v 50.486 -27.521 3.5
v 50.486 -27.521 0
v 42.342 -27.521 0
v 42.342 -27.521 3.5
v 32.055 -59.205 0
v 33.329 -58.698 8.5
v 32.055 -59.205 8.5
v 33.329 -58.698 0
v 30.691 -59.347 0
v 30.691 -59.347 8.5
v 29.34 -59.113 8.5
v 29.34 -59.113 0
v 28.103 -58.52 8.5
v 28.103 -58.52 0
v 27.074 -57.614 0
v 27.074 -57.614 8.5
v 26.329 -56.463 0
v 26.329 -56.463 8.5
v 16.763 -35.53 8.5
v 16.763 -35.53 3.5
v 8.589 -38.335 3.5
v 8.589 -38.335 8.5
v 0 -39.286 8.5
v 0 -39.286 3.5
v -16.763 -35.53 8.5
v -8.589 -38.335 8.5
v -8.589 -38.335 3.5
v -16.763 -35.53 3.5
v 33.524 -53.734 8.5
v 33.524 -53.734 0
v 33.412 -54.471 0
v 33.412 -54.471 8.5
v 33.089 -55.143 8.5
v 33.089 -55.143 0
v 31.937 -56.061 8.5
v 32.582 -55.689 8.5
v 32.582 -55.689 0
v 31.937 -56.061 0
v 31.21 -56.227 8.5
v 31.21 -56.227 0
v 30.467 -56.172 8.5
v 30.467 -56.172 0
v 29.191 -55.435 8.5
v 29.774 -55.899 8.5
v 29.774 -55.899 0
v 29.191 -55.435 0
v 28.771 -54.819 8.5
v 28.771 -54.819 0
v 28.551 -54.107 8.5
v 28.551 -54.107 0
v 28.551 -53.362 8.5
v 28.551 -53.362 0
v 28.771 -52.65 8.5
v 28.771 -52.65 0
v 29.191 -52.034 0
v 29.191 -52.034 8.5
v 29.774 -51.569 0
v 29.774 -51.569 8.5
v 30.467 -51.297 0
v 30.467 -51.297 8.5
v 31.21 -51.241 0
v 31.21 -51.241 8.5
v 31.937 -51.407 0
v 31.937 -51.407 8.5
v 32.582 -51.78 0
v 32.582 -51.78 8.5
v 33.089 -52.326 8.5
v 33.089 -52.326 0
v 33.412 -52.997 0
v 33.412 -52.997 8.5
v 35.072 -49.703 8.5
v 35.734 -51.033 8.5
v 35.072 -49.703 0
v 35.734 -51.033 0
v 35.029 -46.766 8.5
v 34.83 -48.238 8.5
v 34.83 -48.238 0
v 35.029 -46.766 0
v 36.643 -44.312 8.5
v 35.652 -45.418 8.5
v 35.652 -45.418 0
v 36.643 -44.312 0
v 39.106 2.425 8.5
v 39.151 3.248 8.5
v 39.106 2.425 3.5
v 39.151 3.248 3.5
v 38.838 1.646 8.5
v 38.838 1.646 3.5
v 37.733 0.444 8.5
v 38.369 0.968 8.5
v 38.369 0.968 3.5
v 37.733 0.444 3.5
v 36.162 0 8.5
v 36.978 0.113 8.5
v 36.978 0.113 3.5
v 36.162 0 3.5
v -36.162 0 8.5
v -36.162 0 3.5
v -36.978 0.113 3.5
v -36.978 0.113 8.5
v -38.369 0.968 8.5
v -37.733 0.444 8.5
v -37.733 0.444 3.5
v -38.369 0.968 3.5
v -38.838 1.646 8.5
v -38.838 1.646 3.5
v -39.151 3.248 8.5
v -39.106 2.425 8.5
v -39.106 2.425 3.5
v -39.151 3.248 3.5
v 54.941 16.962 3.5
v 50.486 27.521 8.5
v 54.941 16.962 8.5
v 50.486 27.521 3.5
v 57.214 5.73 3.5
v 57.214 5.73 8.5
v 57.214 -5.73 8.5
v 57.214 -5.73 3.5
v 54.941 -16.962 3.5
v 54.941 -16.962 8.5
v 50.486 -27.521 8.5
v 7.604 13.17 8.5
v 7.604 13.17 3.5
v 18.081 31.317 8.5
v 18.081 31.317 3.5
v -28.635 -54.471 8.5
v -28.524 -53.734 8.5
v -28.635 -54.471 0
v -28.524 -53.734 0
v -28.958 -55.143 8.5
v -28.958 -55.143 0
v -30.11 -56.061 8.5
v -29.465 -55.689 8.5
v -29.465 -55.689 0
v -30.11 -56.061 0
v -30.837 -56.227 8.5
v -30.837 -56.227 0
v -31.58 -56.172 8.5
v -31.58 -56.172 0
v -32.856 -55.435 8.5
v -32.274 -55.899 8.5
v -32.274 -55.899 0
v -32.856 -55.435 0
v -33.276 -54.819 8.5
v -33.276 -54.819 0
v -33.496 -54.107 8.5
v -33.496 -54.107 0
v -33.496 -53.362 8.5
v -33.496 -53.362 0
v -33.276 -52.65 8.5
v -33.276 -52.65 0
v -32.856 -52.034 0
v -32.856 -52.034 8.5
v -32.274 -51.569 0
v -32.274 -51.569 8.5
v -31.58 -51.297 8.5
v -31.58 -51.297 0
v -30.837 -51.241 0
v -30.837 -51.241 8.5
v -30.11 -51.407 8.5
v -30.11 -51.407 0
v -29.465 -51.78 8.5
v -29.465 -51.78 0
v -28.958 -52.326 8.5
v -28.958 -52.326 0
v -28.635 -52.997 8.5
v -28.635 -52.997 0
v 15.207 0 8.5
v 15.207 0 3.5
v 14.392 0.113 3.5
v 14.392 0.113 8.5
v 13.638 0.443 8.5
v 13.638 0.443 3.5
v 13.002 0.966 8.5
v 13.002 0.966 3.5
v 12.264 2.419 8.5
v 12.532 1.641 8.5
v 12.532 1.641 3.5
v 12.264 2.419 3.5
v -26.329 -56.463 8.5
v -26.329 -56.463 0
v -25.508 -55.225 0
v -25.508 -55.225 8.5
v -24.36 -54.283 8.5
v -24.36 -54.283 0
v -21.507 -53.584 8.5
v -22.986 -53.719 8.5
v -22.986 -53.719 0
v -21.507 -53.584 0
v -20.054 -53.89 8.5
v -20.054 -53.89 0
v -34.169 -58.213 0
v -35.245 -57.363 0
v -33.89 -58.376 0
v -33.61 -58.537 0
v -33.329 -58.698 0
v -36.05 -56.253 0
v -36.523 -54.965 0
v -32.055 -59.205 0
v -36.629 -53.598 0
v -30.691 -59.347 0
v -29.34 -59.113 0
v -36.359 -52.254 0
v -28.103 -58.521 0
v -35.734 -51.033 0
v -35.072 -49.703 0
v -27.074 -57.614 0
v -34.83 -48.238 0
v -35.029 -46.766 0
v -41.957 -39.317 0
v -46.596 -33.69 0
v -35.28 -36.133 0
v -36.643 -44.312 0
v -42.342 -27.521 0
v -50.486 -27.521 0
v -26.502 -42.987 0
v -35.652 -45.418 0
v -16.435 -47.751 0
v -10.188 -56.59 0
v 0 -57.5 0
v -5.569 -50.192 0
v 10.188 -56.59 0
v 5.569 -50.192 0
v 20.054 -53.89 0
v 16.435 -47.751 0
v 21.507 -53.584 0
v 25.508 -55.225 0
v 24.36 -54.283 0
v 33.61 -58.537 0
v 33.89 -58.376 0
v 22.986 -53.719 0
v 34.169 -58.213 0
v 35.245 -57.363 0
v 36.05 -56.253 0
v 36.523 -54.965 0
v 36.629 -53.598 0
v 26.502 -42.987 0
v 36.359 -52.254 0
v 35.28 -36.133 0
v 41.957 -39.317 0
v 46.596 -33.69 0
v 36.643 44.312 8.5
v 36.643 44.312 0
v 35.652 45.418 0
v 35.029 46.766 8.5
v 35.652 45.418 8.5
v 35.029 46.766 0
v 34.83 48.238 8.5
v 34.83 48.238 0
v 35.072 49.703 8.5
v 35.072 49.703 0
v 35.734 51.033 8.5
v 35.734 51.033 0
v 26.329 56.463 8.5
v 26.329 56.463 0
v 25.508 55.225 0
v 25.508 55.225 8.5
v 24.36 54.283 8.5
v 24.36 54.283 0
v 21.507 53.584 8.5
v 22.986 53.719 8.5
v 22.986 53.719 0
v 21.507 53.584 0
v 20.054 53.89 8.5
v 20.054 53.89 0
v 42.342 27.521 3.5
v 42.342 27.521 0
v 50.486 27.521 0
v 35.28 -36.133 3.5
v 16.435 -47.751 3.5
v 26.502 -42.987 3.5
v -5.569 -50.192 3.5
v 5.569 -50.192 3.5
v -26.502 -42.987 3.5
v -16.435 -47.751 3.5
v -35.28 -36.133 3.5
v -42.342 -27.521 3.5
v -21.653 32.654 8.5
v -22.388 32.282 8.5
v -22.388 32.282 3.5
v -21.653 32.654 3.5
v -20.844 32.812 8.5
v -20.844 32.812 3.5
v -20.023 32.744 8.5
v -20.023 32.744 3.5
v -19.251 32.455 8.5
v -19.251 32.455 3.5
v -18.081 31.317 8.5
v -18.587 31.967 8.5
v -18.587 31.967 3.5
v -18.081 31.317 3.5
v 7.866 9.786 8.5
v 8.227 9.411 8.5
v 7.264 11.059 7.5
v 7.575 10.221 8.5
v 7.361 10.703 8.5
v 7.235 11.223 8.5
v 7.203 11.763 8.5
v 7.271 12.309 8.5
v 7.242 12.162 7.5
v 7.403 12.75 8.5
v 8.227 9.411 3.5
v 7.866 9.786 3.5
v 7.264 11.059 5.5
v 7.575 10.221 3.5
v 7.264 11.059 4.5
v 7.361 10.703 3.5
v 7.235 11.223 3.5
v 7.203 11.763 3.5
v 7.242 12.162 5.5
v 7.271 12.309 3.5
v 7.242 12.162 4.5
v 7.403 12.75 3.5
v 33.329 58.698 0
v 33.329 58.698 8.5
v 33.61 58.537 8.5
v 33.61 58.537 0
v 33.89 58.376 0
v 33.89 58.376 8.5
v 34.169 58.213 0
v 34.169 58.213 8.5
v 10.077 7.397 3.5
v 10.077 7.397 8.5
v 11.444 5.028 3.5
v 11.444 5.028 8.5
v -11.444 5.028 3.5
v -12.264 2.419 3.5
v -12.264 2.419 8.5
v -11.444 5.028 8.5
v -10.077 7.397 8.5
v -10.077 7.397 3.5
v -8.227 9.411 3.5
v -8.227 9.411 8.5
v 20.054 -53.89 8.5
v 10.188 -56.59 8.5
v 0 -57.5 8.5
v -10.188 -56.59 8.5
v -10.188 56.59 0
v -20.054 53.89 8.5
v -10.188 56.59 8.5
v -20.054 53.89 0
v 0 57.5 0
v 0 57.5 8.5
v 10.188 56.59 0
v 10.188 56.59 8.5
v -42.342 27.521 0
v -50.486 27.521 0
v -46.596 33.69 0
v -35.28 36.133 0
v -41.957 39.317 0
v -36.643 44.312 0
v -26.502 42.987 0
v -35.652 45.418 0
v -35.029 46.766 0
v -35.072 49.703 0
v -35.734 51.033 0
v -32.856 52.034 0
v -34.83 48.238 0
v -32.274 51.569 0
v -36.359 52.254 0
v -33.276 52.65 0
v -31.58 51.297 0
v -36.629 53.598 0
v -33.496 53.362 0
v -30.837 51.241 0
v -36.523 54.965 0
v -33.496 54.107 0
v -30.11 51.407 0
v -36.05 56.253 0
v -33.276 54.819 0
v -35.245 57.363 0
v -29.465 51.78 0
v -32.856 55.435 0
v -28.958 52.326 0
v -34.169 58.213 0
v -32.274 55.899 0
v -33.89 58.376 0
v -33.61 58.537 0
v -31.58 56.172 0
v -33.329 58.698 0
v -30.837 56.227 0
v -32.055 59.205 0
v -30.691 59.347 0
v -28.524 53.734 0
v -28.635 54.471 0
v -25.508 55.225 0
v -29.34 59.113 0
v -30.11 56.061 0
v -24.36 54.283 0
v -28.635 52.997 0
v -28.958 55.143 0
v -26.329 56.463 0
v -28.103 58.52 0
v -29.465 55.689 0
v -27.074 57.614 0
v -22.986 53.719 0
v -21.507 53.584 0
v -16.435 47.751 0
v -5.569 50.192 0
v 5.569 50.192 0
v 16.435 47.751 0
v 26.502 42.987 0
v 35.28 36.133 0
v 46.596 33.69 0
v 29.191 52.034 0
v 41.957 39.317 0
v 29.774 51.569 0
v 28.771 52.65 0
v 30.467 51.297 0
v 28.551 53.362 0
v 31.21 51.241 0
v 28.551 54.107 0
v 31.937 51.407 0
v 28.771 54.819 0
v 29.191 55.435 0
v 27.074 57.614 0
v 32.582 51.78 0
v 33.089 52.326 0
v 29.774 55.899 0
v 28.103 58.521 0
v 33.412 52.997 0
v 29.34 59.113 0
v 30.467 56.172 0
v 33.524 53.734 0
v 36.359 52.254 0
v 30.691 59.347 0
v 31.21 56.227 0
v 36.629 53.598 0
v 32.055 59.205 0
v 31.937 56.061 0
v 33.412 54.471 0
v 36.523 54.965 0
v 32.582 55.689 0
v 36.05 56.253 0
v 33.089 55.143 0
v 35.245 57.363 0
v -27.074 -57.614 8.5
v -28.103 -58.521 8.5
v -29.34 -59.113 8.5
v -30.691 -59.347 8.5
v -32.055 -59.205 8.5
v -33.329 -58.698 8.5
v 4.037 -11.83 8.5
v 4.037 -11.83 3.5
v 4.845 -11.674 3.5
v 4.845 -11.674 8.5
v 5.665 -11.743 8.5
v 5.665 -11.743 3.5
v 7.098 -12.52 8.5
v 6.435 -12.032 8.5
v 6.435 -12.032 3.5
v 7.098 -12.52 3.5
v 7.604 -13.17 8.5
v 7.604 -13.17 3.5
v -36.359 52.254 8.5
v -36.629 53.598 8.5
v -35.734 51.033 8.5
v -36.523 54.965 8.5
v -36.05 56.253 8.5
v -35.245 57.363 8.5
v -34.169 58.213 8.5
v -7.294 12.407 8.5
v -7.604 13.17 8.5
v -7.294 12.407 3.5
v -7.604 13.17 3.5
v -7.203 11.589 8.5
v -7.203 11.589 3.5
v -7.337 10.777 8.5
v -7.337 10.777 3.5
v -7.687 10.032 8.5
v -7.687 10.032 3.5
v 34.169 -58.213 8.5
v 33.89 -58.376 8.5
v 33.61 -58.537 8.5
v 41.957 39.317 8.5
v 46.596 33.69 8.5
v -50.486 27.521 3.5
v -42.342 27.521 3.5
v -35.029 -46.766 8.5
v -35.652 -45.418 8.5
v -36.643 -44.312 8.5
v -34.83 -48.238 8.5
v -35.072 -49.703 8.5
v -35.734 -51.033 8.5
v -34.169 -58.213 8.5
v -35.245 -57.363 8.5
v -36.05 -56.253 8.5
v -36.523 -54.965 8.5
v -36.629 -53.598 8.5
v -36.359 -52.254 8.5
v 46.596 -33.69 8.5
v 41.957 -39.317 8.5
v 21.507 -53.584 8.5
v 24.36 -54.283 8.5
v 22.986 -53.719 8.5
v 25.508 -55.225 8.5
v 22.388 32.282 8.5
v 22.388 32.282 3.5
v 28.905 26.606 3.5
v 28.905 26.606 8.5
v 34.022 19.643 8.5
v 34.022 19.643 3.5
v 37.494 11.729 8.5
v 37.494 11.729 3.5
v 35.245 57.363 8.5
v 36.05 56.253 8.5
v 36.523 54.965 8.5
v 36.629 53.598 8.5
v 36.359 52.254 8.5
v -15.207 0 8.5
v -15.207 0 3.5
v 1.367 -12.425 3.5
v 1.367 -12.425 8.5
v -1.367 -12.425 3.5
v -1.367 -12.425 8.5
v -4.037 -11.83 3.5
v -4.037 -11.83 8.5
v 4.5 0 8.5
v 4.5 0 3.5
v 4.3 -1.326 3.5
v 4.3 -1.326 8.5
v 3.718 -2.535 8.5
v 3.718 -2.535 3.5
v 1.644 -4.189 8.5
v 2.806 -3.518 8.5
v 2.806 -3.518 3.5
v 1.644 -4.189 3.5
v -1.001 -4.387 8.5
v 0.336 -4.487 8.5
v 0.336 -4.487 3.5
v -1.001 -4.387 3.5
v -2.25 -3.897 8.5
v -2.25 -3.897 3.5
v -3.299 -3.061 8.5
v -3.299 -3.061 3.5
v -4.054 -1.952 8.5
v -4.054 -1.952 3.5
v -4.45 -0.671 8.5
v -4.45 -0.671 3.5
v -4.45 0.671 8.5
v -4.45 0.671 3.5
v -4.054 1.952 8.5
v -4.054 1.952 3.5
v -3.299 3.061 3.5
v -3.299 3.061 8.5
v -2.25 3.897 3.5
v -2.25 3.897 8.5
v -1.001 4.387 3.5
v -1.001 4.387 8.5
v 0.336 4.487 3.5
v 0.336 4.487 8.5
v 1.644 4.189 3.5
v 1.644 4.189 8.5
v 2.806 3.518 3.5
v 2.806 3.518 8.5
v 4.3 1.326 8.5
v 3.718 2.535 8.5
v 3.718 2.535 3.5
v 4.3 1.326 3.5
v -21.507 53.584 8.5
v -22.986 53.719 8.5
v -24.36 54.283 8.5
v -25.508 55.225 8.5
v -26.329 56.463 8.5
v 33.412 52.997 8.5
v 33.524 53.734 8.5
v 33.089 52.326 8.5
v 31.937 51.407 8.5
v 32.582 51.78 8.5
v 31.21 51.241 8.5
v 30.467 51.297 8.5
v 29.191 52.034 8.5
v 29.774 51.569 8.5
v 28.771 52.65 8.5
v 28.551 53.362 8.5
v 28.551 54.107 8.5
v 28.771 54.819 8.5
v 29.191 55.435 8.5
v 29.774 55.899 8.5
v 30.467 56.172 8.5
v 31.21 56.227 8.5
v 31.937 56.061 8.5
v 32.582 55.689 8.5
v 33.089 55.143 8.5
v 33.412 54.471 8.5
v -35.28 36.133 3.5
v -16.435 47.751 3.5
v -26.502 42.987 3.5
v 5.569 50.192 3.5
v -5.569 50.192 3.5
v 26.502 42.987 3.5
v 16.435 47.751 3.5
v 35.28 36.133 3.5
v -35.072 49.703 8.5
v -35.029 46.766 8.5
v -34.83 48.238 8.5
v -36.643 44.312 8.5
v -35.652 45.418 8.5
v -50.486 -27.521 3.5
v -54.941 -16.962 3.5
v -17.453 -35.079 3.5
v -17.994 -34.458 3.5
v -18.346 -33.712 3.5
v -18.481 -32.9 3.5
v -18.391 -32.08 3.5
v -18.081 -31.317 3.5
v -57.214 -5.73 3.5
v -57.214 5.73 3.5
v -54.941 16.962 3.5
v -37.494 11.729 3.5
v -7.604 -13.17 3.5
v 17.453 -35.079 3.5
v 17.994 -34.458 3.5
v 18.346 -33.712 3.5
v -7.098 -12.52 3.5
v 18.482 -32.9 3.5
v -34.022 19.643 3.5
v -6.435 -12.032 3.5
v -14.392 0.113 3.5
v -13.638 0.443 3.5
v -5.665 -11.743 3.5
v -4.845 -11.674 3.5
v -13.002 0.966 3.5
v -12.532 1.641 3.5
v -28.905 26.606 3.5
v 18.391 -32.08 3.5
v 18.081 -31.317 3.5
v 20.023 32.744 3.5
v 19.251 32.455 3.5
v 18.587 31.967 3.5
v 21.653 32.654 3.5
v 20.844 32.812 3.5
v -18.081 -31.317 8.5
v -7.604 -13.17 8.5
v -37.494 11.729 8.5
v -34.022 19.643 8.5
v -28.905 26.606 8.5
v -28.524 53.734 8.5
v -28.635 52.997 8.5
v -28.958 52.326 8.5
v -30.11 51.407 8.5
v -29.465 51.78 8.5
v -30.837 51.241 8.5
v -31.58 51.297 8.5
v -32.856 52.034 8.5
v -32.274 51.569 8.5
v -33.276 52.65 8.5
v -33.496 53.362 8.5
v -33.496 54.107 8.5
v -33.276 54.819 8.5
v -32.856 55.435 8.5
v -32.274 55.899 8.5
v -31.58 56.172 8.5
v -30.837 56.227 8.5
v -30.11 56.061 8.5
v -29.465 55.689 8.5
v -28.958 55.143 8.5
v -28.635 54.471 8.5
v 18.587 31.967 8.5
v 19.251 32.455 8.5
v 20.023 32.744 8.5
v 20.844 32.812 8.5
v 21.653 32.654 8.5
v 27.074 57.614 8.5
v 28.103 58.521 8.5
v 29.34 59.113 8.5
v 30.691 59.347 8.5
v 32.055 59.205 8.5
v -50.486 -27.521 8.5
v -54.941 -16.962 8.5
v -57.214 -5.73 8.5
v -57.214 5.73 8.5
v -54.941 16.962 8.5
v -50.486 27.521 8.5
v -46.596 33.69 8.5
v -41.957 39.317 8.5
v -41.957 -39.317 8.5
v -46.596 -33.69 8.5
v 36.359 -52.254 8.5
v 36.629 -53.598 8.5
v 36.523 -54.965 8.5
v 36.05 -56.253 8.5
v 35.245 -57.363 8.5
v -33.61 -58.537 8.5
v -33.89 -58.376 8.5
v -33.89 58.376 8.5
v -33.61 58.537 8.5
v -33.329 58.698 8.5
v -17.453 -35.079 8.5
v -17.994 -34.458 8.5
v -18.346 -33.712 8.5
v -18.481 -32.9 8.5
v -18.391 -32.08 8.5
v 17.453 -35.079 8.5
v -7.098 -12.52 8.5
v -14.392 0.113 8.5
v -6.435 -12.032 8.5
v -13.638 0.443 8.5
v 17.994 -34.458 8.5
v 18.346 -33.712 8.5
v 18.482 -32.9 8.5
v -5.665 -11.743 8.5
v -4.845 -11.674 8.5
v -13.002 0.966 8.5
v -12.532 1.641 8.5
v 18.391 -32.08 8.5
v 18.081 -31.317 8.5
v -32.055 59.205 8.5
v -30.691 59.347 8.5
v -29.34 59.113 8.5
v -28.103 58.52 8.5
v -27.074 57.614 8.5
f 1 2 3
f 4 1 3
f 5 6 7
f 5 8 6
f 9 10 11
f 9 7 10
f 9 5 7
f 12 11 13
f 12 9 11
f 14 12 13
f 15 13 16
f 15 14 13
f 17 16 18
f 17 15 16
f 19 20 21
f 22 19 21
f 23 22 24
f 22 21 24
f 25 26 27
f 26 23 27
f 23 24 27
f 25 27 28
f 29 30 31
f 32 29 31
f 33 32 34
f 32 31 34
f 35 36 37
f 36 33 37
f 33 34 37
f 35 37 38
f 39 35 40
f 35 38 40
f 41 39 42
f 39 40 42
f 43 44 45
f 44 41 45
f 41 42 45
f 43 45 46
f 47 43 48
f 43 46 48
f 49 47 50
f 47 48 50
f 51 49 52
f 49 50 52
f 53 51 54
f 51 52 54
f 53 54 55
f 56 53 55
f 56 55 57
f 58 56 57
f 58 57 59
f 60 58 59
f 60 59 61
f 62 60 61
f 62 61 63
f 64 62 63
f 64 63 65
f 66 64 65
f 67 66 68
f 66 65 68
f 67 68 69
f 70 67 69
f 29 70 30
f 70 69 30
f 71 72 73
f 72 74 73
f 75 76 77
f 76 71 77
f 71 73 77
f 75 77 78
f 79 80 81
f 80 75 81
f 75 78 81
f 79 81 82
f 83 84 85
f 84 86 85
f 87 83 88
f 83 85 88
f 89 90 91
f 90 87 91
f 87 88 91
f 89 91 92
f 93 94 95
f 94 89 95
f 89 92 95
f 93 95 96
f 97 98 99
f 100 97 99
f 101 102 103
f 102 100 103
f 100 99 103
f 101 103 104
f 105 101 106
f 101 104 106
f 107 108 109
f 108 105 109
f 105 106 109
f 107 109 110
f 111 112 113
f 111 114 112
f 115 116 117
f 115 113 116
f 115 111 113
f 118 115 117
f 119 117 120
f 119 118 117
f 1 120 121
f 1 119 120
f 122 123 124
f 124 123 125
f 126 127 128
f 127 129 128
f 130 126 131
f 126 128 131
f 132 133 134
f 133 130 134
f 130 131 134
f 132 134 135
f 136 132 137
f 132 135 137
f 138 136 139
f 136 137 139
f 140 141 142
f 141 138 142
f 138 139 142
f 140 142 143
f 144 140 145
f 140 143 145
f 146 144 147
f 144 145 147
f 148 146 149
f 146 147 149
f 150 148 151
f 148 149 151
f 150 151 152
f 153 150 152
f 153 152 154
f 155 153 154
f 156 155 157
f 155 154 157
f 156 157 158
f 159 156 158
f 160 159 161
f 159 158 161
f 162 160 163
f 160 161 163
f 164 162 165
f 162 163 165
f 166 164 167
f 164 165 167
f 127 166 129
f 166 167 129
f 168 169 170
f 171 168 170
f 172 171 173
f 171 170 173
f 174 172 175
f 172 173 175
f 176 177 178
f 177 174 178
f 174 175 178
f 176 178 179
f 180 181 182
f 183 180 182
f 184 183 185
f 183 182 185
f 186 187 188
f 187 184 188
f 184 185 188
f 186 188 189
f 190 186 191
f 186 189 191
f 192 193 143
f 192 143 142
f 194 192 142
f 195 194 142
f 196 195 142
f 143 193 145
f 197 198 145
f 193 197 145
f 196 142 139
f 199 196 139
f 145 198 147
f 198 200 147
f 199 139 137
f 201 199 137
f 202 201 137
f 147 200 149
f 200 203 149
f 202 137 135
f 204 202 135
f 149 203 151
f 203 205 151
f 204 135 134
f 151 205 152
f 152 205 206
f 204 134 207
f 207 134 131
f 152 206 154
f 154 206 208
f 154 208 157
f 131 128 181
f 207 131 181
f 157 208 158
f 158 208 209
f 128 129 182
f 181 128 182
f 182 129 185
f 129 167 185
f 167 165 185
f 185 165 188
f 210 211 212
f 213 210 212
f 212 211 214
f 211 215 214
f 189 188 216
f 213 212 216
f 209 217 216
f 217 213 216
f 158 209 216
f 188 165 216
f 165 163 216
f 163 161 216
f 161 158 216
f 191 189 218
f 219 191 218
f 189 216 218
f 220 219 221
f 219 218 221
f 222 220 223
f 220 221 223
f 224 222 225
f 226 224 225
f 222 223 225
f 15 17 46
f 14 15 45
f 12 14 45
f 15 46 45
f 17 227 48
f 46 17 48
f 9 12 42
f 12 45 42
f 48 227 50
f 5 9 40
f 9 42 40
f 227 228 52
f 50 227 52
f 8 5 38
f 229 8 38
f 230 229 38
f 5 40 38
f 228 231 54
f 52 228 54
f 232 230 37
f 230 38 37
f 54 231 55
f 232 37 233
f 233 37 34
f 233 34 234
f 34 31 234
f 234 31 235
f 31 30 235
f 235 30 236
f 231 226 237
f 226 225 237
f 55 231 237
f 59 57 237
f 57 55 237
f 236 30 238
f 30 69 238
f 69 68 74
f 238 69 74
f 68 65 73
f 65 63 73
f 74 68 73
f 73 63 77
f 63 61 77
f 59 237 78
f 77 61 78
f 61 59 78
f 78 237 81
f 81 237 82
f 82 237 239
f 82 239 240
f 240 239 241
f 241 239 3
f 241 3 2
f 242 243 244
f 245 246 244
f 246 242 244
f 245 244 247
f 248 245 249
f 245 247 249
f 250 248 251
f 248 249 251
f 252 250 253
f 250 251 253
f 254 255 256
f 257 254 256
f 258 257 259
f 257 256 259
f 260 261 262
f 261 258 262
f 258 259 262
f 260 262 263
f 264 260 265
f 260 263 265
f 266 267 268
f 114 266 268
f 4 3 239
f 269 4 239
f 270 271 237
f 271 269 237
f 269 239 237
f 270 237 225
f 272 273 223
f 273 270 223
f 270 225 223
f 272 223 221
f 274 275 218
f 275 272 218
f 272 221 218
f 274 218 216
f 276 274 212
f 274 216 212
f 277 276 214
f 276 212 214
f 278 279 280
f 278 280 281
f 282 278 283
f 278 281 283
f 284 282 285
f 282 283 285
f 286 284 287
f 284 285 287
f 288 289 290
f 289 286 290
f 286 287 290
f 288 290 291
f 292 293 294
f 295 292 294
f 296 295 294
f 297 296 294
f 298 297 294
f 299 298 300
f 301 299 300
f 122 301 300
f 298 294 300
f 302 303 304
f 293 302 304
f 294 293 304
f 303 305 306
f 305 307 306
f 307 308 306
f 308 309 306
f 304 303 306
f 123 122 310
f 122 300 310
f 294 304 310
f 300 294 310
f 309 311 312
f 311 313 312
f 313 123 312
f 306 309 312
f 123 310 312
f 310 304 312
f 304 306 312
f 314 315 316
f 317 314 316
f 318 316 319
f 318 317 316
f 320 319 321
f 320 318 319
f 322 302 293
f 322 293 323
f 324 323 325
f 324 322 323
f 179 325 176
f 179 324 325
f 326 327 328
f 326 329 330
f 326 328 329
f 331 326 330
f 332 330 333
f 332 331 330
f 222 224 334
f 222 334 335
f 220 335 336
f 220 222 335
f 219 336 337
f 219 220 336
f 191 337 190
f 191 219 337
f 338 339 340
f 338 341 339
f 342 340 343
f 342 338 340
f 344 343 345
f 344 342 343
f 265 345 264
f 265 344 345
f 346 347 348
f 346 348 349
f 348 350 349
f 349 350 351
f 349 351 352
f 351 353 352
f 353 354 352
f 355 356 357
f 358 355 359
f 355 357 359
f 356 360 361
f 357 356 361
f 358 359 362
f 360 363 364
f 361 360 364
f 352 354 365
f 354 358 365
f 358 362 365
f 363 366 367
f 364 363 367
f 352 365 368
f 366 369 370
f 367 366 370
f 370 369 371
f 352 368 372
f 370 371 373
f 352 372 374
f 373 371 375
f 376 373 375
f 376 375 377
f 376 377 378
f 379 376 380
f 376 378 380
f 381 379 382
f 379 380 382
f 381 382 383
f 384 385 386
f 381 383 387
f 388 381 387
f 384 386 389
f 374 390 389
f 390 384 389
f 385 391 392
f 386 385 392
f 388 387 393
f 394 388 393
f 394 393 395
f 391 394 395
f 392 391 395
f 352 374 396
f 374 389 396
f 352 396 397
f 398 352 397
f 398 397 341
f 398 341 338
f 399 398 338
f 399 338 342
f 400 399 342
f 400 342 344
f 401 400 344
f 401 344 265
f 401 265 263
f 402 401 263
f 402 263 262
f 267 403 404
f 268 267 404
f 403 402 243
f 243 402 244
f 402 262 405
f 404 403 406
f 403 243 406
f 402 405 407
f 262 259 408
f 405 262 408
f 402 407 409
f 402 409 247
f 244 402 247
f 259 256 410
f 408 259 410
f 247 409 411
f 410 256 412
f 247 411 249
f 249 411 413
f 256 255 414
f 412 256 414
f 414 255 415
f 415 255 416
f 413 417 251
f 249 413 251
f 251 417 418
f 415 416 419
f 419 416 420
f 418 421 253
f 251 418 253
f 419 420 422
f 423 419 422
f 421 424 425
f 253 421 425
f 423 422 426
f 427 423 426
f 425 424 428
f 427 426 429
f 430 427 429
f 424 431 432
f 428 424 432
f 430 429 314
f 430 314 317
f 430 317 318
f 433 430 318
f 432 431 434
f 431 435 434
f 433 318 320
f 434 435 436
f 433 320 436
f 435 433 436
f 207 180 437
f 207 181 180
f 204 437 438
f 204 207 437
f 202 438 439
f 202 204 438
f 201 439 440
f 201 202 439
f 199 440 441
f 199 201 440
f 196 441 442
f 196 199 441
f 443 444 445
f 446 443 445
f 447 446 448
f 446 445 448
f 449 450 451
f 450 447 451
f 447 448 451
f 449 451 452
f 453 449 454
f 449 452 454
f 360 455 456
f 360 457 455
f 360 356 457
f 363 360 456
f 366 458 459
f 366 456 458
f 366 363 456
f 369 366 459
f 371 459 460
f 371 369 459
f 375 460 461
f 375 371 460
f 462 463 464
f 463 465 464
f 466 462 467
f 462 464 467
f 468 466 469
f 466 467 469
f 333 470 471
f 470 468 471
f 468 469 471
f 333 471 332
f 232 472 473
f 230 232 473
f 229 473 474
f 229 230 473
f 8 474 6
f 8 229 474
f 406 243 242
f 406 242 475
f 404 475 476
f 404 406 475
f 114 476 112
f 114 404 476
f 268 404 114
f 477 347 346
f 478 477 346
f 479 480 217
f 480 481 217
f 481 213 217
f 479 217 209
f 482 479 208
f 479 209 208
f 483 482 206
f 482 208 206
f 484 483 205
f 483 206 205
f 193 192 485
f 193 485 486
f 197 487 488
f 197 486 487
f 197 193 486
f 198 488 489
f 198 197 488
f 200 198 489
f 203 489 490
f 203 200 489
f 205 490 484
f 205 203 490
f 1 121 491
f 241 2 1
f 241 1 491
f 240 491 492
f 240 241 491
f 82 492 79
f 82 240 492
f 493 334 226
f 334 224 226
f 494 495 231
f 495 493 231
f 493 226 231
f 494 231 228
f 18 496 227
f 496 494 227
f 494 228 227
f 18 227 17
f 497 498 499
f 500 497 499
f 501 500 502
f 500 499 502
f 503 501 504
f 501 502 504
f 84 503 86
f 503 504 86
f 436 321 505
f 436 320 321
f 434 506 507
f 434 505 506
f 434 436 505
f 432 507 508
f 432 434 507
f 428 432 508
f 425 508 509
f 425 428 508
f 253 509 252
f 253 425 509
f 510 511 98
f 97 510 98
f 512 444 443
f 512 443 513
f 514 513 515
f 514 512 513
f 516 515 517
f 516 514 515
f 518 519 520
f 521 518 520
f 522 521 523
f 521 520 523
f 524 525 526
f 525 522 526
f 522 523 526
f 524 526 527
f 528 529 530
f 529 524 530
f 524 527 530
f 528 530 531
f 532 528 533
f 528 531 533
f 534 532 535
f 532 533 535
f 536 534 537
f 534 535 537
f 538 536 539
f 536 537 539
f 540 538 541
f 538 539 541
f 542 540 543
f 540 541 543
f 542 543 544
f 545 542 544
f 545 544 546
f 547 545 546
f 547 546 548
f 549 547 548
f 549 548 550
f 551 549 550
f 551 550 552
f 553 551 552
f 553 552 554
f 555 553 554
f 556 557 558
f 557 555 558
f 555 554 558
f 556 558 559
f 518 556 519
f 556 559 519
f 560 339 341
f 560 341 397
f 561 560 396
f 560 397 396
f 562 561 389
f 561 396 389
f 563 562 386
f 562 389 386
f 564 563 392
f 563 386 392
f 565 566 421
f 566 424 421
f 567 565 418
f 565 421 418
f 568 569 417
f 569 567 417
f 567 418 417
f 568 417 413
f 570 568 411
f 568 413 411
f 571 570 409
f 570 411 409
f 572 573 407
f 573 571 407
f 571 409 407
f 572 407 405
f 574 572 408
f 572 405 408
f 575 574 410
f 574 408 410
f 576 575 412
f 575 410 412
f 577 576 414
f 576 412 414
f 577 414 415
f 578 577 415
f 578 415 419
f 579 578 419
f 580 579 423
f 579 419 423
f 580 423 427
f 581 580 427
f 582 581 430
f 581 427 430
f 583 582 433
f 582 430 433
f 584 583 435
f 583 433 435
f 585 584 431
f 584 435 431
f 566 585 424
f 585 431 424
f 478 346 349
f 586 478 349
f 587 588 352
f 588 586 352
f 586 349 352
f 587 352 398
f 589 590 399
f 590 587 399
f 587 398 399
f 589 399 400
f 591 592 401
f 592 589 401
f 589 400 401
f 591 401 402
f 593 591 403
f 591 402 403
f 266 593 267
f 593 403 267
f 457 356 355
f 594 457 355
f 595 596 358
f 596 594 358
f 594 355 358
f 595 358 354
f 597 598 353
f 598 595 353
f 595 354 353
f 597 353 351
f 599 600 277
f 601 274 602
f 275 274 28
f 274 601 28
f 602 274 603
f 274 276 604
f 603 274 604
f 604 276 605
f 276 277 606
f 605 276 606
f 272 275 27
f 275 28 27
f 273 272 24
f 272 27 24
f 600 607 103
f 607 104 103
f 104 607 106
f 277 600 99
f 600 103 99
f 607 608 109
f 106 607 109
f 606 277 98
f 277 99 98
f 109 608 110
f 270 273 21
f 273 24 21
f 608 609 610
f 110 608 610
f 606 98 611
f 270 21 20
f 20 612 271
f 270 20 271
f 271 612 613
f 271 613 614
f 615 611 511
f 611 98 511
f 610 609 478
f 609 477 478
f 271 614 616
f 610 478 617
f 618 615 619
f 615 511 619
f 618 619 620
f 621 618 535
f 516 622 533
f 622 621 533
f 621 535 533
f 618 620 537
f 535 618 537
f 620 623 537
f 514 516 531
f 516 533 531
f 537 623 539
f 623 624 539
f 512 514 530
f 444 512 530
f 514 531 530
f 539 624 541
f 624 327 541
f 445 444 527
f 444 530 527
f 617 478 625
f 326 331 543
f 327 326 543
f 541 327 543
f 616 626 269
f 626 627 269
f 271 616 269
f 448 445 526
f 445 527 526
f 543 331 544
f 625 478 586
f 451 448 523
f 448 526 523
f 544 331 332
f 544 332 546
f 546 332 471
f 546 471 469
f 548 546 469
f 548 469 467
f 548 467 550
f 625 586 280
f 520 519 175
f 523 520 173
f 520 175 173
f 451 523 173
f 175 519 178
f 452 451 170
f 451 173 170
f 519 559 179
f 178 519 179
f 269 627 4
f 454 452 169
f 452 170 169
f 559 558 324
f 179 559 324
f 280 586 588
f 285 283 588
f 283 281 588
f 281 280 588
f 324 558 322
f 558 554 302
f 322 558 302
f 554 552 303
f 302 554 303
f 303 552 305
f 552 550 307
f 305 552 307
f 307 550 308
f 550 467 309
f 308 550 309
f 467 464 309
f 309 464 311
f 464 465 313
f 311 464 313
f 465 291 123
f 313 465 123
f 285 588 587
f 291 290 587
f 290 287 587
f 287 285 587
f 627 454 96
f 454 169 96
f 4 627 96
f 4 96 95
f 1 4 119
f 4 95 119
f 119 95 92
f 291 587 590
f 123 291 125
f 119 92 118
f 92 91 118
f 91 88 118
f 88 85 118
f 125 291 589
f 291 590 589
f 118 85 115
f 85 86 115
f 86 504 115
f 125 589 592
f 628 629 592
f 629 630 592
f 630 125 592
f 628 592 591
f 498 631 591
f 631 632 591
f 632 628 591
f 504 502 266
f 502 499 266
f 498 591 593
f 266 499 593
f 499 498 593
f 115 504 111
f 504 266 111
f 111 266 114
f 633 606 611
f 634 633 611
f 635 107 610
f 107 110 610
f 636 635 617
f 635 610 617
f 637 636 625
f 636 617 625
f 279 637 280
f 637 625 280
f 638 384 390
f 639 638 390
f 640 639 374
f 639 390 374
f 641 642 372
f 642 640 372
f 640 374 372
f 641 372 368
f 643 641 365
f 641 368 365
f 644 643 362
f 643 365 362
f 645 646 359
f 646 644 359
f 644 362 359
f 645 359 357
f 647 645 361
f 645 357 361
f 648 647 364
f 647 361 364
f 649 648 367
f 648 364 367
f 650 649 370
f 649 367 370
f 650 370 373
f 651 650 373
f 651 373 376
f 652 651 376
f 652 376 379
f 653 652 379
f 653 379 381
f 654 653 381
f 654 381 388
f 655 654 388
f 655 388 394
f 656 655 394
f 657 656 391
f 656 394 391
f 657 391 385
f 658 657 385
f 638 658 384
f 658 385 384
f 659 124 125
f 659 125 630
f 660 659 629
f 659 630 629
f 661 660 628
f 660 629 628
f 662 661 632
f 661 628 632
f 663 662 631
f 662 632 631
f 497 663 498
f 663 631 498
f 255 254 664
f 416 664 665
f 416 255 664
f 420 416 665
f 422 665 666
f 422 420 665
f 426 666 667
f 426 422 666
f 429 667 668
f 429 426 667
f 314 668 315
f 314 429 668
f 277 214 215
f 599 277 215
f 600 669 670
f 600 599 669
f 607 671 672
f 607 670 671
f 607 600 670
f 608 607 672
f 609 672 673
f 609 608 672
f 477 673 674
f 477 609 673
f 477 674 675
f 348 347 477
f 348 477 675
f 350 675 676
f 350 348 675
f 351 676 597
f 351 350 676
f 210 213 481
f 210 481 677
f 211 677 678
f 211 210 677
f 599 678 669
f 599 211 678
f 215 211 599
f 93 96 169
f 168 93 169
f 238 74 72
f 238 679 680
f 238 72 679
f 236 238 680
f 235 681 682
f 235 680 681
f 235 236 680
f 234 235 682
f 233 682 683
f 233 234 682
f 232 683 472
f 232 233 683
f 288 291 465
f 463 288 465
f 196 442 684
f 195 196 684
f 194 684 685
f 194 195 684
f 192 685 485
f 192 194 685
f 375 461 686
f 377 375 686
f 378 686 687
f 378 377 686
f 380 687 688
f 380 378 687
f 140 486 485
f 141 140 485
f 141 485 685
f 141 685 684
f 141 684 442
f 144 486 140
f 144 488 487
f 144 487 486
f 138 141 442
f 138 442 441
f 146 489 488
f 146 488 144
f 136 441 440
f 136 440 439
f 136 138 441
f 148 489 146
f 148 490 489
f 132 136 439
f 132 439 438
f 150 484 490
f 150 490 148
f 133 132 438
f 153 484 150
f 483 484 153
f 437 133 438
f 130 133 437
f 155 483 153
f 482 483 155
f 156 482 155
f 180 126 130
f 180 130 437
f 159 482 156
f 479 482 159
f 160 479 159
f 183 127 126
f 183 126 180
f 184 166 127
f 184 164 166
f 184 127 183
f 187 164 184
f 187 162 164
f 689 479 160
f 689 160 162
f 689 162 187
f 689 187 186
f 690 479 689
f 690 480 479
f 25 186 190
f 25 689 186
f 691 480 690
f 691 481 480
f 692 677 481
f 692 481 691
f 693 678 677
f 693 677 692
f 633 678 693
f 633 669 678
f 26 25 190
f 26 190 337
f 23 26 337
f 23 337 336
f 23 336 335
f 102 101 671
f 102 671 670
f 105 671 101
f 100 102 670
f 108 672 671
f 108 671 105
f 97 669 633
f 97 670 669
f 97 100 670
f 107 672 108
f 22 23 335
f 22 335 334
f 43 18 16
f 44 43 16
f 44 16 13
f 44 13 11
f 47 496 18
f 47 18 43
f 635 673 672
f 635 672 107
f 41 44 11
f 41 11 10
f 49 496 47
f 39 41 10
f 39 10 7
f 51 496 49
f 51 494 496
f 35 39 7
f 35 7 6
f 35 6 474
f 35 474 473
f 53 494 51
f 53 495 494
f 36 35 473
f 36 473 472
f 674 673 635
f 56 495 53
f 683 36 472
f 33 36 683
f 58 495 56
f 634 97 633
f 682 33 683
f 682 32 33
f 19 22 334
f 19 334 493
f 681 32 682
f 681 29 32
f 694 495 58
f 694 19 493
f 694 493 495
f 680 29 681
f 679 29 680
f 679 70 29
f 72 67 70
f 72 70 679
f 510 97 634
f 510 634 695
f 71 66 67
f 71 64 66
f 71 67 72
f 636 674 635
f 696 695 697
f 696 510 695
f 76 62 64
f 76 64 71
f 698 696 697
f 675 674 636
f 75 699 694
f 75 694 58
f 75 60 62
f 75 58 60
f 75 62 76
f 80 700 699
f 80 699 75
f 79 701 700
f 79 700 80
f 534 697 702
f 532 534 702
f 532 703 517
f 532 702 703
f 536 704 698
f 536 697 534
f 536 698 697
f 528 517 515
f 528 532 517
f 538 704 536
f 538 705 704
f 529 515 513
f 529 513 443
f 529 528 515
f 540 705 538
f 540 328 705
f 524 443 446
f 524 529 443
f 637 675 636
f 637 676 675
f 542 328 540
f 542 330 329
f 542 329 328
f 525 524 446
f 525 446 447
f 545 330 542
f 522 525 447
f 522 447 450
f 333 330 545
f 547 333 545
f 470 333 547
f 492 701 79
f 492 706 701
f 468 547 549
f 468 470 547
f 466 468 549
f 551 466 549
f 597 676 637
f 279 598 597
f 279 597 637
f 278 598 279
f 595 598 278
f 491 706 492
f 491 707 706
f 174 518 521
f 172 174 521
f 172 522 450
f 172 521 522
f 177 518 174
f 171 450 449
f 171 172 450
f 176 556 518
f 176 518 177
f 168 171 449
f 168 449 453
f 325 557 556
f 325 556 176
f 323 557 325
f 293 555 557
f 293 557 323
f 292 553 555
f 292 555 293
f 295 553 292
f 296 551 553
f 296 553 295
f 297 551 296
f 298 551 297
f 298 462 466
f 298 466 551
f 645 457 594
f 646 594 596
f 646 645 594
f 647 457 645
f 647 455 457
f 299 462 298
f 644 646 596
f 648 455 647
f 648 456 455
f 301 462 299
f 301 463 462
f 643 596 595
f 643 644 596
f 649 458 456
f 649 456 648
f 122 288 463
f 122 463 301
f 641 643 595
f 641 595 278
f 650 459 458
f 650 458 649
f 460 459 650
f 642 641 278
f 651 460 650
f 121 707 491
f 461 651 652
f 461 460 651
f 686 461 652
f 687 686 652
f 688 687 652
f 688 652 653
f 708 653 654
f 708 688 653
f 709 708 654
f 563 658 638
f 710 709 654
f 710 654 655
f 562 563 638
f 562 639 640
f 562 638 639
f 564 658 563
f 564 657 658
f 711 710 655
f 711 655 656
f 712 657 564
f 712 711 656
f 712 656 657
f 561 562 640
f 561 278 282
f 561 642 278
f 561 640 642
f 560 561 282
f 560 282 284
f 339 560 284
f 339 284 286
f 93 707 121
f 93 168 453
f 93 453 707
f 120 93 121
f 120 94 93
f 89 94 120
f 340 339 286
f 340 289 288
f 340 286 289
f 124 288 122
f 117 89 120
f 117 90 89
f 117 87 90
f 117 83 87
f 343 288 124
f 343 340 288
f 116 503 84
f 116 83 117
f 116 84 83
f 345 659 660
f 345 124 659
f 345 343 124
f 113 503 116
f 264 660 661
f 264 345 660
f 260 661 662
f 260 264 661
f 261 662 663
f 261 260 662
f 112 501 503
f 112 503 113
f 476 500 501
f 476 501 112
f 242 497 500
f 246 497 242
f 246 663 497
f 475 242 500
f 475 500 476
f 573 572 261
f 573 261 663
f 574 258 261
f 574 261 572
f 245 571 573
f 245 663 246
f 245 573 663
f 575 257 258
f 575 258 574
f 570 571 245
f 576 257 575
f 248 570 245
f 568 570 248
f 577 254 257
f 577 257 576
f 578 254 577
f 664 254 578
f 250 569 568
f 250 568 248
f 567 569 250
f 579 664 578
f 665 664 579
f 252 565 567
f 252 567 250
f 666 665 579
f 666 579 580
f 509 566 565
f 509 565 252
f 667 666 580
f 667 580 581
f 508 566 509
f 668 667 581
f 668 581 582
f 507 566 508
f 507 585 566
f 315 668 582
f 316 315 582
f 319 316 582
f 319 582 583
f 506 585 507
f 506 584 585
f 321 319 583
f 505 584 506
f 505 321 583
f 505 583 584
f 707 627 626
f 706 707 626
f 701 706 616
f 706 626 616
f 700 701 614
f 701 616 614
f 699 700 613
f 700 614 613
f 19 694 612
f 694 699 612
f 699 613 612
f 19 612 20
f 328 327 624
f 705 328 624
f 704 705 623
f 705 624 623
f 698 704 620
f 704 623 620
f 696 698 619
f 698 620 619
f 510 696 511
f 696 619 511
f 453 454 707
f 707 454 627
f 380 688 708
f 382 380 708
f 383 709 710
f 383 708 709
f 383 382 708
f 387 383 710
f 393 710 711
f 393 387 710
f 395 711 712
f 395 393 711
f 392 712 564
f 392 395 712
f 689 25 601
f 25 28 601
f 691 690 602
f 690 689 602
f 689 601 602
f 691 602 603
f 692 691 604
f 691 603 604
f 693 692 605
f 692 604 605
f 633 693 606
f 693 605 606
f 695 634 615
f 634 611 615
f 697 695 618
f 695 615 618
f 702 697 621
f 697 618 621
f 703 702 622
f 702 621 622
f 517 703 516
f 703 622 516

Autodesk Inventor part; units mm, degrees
ref_plane "YZ Plane" through (0, 0, 0) normal (1, 0, 0) x (0, 1, 0)
ref_plane "XZ Plane" through (0, 0, 0) normal (0, 1, 0) x (-1, 0, 0)
ref_plane "XY Plane" through (0, 0, 0) normal (0, 0, 1) x (1, 0, 0)
sketch "Sketch1" plane through (0, 0, 0) normal (0, 0, 1) x (1, 0, 0)
  circle A0 centre (31.0235, 53.7343) radius 2.5 projected
  arc A1 (33.3294, 58.6976) -> (26.329, 56.4627) centre (30.8605, 54.3496) ccw projected
  arc A2 (20.0536, 53.8897) -> (26.329, 56.4627) centre (21.7974, 58.5758) ccw projected
  arc A3 (20.0536, 53.8897) -> (-20.0536, 53.8897) centre (0, 0) ccw projected
  arc A4 (-26.329, 56.4627) -> (-20.0536, 53.8897) centre (-21.7974, 58.5758) ccw projected
  arc A5 (-26.329, 56.4627) -> (-33.3294, 58.6976) centre (-30.8605, 54.3496) ccw projected
  arc A6 (-33.3294, 58.6976) -> (-34.1689, 58.2129) centre (0, 0) ccw projected
  arc A7 (-34.1689, 58.2129) -> (-35.7336, 51.0329) centre (-31.6379, 53.9008) ccw projected
  arc A8 (-36.643, 44.3118) -> (-35.7336, 51.0329) centre (-39.8294, 48.165) ccw projected
  arc A9 (-36.643, 44.3118) -> (-50.486, 27.5211) centre (0, 0) ccw projected
  line L0 (-50.486, 27.5211) -> (-42.3419, 27.5211) projected
  arc A10 (42.3419, 27.5211) -> (-42.3419, 27.5211) centre (0, 0) ccw projected
  line L1 (42.3419, 27.5211) -> (50.486, 27.5211) projected
  arc A11 (50.486, 27.5211) -> (36.643, 44.3118) centre (0, 0) ccw projected
  arc A12 (35.7336, 51.0329) -> (36.643, 44.3118) centre (39.8294, 48.165) ccw projected
  arc A13 (35.7336, 51.0329) -> (34.1689, 58.2129) centre (31.6379, 53.9008) ccw projected
  arc A14 (34.1689, 58.2129) -> (33.3294, 58.6976) centre (0, 0) ccw projected
  circle A15 centre (-31.0235, 53.7343) radius 2.5 projected
  arc A16 (26.329, -56.4627) -> (33.3294, -58.6976) centre (30.8605, -54.3496) ccw projected
  arc A17 (33.3294, -58.6976) -> (34.1689, -58.2129) centre (0, 0) ccw projected
  arc A18 (34.1689, -58.2129) -> (35.7336, -51.0329) centre (31.6379, -53.9008) ccw projected
  arc A19 (36.643, -44.3118) -> (35.7336, -51.0329) centre (39.8294, -48.165) ccw projected
  arc A20 (36.643, -44.3118) -> (50.486, -27.5211) centre (0, 0) ccw projected
  line L2 (50.486, -27.5211) -> (42.3419, -27.5211) projected
  arc A21 (-42.3419, -27.5211) -> (42.3419, -27.5211) centre (0, 0) ccw projected
  line L3 (-42.3419, -27.5211) -> (-50.486, -27.5211) projected
  arc A22 (-50.486, -27.5211) -> (-36.643, -44.3118) centre (0, 0) ccw projected
  arc A23 (-35.7336, -51.0329) -> (-36.643, -44.3118) centre (-39.8294, -48.165) ccw projected
  arc A24 (-35.7336, -51.0329) -> (-34.1689, -58.2129) centre (-31.6379, -53.9008) ccw projected
  arc A25 (-34.1689, -58.2129) -> (-33.3294, -58.6976) centre (0, 0) ccw projected
  arc A26 (-33.3294, -58.6976) -> (-26.329, -56.4627) centre (-30.8605, -54.3496) ccw projected
  arc A27 (-20.0536, -53.8897) -> (-26.329, -56.4627) centre (-21.7974, -58.5758) ccw projected
  arc A28 (-20.0536, -53.8897) -> (20.0536, -53.8897) centre (0, 0) ccw projected
  arc A29 (26.329, -56.4627) -> (20.0536, -53.8897) centre (21.7974, -58.5758) ccw projected
  circle A30 centre (31.0235, -53.7343) radius 2.5 projected
  circle A31 centre (-31.0235, -53.7343) radius 2.5 projected
extrude "Extrusion1" add sketch "Sketch1" along normal blind 3.5
sketch "Sketch2" plane through (0, 0, 3.5) normal (0, 0, 1) x (1, 0, 0)
  circle A0 centre (-31.0235, 53.7343) radius 2.5 projected
  circle A1 centre (31.0235, 53.7343) radius 2.5 projected
  arc A2 (33.3294, 58.6976) -> (26.329, 56.4627) centre (30.8605, 54.3496) ccw projected
  arc A3 (20.0536, 53.8897) -> (26.329, 56.4627) centre (21.7974, 58.5758) ccw projected
  arc A4 (20.0536, 53.8897) -> (-20.0536, 53.8897) centre (0, 0) ccw projected
  arc A5 (-26.329, 56.4627) -> (-20.0536, 53.8897) centre (-21.7974, 58.5758) ccw projected
  arc A6 (-26.329, 56.4627) -> (-33.3294, 58.6976) centre (-30.8605, 54.3496) ccw projected
  arc A7 (-33.3294, 58.6976) -> (-34.1689, 58.2129) centre (0, 0) ccw projected
  arc A8 (-34.1689, 58.2129) -> (-35.7336, 51.0329) centre (-31.6379, 53.9008) ccw projected
  arc A9 (-36.643, 44.3118) -> (-35.7336, 51.0329) centre (-39.8294, 48.165) ccw projected
  arc A10 (-36.643, 44.3118) -> (-50.486, 27.5211) centre (0, 0) ccw projected
  line L0 (-50.486, 27.5211) -> (-42.3419, 27.5211) projected
  arc A11 (42.3419, 27.5211) -> (-42.3419, 27.5211) centre (0, 0) ccw projected
  line L1 (42.3419, 27.5211) -> (50.486, 27.5211) projected
  arc A12 (50.486, 27.5211) -> (36.643, 44.3118) centre (0, 0) ccw projected
  arc A13 (35.7336, 51.0329) -> (36.643, 44.3118) centre (39.8294, 48.165) ccw projected
  arc A14 (35.7336, 51.0329) -> (34.1689, 58.2129) centre (31.6379, 53.9008) ccw projected
  arc A15 (34.1689, 58.2129) -> (33.3294, 58.6976) centre (0, 0) ccw projected
  circle A16 centre (-31.0235, -53.7343) radius 2.5 projected
  circle A17 centre (31.0235, -53.7343) radius 2.5 projected
  arc A18 (26.329, -56.4627) -> (33.3294, -58.6976) centre (30.8605, -54.3496) ccw projected
  arc A19 (33.3294, -58.6976) -> (34.1689, -58.2129) centre (0, 0) ccw projected
  arc A20 (34.1689, -58.2129) -> (35.7336, -51.0329) centre (31.6379, -53.9008) ccw projected
  arc A21 (36.643, -44.3118) -> (35.7336, -51.0329) centre (39.8294, -48.165) ccw projected
  arc A22 (36.643, -44.3118) -> (50.486, -27.5211) centre (0, 0) ccw projected
  line L2 (50.486, -27.5211) -> (42.3419, -27.5211) projected
  arc A23 (-42.3419, -27.5211) -> (42.3419, -27.5211) centre (0, 0) ccw projected
  line L3 (-42.3419, -27.5211) -> (-50.486, -27.5211) projected
  arc A24 (-50.486, -27.5211) -> (-36.643, -44.3118) centre (0, 0) ccw projected
  arc A25 (-35.7336, -51.0329) -> (-36.643, -44.3118) centre (-39.8294, -48.165) ccw projected
  arc A26 (-35.7336, -51.0329) -> (-34.1689, -58.2129) centre (-31.6379, -53.9008) ccw projected
  arc A27 (-34.1689, -58.2129) -> (-33.3294, -58.6976) centre (0, 0) ccw projected
  arc A28 (-33.3294, -58.6976) -> (-26.329, -56.4627) centre (-30.8605, -54.3496) ccw projected
  arc A29 (-20.0536, -53.8897) -> (-26.329, -56.4627) centre (-21.7974, -58.5758) ccw projected
  arc A30 (-20.0536, -53.8897) -> (20.0536, -53.8897) centre (0, 0) ccw projected
  arc A31 (26.329, -56.4627) -> (20.0536, -53.8897) centre (21.7974, -58.5758) ccw projected
  arc A32 (-50.486, 27.5211) -> (-50.486, -27.5211) centre (0, 0) ccw
  arc A33 (50.486, -27.5211) -> (50.486, 27.5211) centre (0, 0) ccw
  line L4 (-18.0807, 31.3168) -> (-7.6035, 13.1696) projected
  arc A34 (-22.3885, 32.2819) -> (-39.1512, 3.248) centre (0, 0) ccw projected
  line L5 (-15.2069, 0) -> (-36.1615, 0) projected
  line L6 (-18.0807, -31.3168) -> (-7.6035, -13.1696) projected
  line L7 (7.6035, -13.1696) -> (18.0807, -31.3168) projected
  arc A35 (-16.7627, -35.53) -> (16.7627, -35.53) centre (0, 0) ccw projected
  line L8 (36.1615, 0) -> (15.2069, 0) projected
  line L9 (7.6035, 13.1696) -> (18.0807, 31.3168) projected
  arc A36 (39.1512, 3.248) -> (22.3885, 32.2819) centre (0, 0) ccw projected
  arc A37 (12.2636, 2.4194) -> (8.227, 9.4109) centre (0, 0) ccw projected
  arc A38 (-8.227, 9.4109) -> (-12.2636, 2.4194) centre (0, 0) ccw projected
  arc A39 (-4.0366, -11.8303) -> (4.0366, -11.8303) centre (0, 0) ccw projected
  arc A40 (-18.0807, 31.3168) -> (-22.3885, 32.2819) centre (-20.6788, 29.8168) ccw projected
  arc A41 (-39.1512, 3.248) -> (-36.1615, 0) centre (-36.1615, 3) ccw projected
  arc A42 (-15.2069, 0) -> (-12.2636, 2.4194) centre (-15.2069, 3) ccw projected
  arc A43 (-8.227, 9.4109) -> (-7.6035, 13.1696) centre (-10.2015, 11.6696) ccw projected
  spline S0 degree 3 poles (8.227, 9.4109) (8.2253, 9.4125) (8.2235, 9.414) (7.9828, 9.6254) (7.7777, 9.8729) (7.4513, 10.4284) (7.3317, 10.735) (7.19, 11.4166) (7.1804, 11.7904) (7.3007, 12.5134) (7.4219, 12.855) (7.6035, 13.1696) knots -0.433605 -0.433605 -0.433605 -0.433605 -0.432845 -0.432845 -0.329157 -0.329157 -0.224657 -0.224657 -0.109223 -0.109223 0 0 0 0 projected
  arc A44 (22.3885, 32.2819) -> (18.0807, 31.3168) centre (20.6788, 29.8168) ccw projected
  arc A45 (36.1615, 0) -> (39.1512, 3.248) centre (36.1615, 3) ccw projected
  arc A46 (12.2636, 2.4194) -> (15.2069, 0) centre (15.2069, 3) ccw projected
  arc A47 (7.6035, -13.1696) -> (4.0366, -11.8303) centre (5.0054, -14.6696) ccw projected
  arc A48 (-4.0366, -11.8303) -> (-7.6035, -13.1696) centre (-5.0054, -14.6696) ccw projected
  arc A49 (-18.0807, -31.3168) -> (-16.7627, -35.53) centre (-15.4827, -32.8168) ccw projected
  arc A50 (16.7627, -35.53) -> (18.0807, -31.3168) centre (15.4827, -32.8168) ccw projected
  circle A51 centre (0, 0) radius 4.5 projected
extrude "Extrusion2" add sketch "Sketch2" along normal blind 5
properties part number "bottom_shield"
